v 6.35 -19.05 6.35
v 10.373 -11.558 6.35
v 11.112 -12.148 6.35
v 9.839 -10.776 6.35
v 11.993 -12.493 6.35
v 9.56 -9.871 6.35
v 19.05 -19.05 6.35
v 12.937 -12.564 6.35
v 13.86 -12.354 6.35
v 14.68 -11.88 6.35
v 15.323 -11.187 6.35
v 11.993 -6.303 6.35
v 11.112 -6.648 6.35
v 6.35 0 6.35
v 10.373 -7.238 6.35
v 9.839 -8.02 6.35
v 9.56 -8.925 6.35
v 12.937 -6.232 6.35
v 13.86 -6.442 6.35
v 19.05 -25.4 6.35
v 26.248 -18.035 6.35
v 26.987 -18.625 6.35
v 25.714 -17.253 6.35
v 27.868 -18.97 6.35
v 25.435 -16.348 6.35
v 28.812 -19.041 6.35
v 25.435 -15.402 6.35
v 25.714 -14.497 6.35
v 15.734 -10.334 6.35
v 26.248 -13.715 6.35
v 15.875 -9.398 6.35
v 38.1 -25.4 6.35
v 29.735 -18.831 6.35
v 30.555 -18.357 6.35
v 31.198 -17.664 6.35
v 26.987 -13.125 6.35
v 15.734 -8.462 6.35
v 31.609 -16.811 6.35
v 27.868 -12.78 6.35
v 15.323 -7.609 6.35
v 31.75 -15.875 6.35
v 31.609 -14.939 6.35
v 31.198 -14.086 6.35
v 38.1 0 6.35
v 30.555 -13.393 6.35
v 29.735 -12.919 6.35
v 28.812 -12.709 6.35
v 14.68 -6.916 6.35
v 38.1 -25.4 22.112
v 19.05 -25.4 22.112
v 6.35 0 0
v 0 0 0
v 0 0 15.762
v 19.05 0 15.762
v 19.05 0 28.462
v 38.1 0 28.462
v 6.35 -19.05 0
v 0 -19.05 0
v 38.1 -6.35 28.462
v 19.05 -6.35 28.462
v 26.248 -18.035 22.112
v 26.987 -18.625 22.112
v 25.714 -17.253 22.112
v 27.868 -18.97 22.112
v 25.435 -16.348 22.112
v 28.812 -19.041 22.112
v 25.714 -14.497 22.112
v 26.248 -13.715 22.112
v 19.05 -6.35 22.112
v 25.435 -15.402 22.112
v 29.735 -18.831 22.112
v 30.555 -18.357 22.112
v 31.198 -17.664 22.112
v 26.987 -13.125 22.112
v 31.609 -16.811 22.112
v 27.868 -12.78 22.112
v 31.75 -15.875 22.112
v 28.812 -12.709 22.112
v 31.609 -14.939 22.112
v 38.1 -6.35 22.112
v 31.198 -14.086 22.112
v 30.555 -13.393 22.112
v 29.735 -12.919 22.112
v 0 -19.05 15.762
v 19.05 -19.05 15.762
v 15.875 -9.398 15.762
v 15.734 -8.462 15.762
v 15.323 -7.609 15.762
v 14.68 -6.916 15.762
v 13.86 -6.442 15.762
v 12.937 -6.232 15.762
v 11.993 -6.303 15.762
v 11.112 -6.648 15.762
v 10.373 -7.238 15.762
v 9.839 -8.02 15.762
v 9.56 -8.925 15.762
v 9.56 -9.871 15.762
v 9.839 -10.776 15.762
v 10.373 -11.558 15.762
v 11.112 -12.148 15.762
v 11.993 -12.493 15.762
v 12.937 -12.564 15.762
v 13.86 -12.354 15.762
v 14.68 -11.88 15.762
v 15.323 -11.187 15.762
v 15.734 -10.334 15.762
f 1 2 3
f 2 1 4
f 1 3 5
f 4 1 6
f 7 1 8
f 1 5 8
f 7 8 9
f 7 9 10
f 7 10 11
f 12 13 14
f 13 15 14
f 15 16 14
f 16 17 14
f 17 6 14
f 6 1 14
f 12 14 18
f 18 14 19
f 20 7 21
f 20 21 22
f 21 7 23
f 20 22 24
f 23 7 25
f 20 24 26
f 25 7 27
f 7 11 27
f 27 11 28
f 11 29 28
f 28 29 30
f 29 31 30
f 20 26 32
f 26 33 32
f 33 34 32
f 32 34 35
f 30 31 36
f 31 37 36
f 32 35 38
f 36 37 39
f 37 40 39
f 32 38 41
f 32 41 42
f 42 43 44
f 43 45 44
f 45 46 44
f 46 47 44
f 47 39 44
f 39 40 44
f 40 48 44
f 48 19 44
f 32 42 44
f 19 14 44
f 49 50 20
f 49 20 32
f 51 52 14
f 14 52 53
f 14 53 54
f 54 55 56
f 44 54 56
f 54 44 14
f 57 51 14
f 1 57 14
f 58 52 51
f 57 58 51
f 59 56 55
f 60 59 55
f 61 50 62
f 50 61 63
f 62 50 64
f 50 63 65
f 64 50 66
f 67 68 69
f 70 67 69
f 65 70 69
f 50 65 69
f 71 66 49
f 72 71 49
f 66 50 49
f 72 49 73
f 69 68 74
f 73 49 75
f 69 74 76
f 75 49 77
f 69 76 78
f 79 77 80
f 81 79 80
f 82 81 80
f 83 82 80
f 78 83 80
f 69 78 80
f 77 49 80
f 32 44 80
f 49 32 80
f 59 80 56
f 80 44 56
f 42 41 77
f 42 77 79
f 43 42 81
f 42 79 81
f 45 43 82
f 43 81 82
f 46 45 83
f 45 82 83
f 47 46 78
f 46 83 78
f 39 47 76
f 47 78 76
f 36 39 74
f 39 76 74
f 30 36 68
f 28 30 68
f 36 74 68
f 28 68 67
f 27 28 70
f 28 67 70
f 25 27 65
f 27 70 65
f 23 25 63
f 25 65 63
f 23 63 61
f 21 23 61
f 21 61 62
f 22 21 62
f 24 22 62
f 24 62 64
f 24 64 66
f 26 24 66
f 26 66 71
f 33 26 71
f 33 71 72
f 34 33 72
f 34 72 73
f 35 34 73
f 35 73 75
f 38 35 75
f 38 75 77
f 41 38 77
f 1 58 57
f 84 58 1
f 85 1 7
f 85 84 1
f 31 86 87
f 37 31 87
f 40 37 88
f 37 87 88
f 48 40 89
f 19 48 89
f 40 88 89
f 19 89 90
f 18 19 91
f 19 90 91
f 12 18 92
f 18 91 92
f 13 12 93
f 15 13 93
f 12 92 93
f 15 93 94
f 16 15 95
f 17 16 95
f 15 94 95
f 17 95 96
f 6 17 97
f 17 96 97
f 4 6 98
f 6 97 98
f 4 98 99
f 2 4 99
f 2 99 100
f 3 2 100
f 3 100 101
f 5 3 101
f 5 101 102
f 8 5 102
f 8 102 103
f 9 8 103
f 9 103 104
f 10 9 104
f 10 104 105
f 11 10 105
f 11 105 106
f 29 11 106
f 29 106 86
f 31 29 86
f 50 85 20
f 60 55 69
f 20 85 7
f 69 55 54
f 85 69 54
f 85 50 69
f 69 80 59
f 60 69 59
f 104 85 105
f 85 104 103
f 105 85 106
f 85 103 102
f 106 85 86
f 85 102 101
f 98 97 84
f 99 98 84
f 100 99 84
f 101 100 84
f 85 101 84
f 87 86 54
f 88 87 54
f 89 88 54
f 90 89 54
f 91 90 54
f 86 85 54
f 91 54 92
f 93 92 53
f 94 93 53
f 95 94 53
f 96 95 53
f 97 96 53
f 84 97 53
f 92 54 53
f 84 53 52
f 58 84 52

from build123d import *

# Parameters (mm, degrees)
F1_DEPTH = 19.05
F3_DEPTH = 6.35
F4_W     = 19.05
F4_H     = 6.35
F5_DEPTH = 38.101
F6_R     = 3.175
F7_DEPTH = 22.112613
F8_R     = 3.175
F9_DEPTH = 15.762613


with BuildPart() as f1:
    # F0 (on Front) → F1 (new body)
    with BuildSketch(Plane.XZ):
        Polygon((0, 15.761613), (0, 0), (6.35, 0), (6.35, 6.35), (38.1, 6.35), (38.1, 28.461613), (19.05, 28.461613), (19.05, 15.761613), align=None)
    extrude(amount=F1_DEPTH)

    # F2 (on face) → F3 (join)
    with BuildSketch(Plane.XZ.offset(19.05)):
        Polygon((38.1, 28.461613), (19.05, 28.461613), (19.05, 15.761613), (19.05, 6.35), (38.1, 6.35), align=None)
    extrude(amount=F3_DEPTH)

    # F4 (on face) → F5 (cut, through all)
    with BuildSketch(Plane.YZ.offset(38.1)):
        with Locations((-15.875, 25.286613)):
            Rectangle(F4_W, F4_H)
    extrude(amount=-F5_DEPTH, mode=Mode.SUBTRACT)

    # F6 (on face) → F7 (cut, through all)
    with BuildSketch(Plane.XY.offset(22.111613)):
        with Locations((28.575, -15.875)):
            Circle(F6_R)
    extrude(amount=-F7_DEPTH, mode=Mode.SUBTRACT)

    # F8 (on face) → F9 (cut, through all)
    with BuildSketch(Plane.XY.offset(15.761613)):
        with Locations((12.7, -9.398)):
            Circle(F8_R)
    extrude(amount=-F9_DEPTH, mode=Mode.SUBTRACT)


solid = f1.part
